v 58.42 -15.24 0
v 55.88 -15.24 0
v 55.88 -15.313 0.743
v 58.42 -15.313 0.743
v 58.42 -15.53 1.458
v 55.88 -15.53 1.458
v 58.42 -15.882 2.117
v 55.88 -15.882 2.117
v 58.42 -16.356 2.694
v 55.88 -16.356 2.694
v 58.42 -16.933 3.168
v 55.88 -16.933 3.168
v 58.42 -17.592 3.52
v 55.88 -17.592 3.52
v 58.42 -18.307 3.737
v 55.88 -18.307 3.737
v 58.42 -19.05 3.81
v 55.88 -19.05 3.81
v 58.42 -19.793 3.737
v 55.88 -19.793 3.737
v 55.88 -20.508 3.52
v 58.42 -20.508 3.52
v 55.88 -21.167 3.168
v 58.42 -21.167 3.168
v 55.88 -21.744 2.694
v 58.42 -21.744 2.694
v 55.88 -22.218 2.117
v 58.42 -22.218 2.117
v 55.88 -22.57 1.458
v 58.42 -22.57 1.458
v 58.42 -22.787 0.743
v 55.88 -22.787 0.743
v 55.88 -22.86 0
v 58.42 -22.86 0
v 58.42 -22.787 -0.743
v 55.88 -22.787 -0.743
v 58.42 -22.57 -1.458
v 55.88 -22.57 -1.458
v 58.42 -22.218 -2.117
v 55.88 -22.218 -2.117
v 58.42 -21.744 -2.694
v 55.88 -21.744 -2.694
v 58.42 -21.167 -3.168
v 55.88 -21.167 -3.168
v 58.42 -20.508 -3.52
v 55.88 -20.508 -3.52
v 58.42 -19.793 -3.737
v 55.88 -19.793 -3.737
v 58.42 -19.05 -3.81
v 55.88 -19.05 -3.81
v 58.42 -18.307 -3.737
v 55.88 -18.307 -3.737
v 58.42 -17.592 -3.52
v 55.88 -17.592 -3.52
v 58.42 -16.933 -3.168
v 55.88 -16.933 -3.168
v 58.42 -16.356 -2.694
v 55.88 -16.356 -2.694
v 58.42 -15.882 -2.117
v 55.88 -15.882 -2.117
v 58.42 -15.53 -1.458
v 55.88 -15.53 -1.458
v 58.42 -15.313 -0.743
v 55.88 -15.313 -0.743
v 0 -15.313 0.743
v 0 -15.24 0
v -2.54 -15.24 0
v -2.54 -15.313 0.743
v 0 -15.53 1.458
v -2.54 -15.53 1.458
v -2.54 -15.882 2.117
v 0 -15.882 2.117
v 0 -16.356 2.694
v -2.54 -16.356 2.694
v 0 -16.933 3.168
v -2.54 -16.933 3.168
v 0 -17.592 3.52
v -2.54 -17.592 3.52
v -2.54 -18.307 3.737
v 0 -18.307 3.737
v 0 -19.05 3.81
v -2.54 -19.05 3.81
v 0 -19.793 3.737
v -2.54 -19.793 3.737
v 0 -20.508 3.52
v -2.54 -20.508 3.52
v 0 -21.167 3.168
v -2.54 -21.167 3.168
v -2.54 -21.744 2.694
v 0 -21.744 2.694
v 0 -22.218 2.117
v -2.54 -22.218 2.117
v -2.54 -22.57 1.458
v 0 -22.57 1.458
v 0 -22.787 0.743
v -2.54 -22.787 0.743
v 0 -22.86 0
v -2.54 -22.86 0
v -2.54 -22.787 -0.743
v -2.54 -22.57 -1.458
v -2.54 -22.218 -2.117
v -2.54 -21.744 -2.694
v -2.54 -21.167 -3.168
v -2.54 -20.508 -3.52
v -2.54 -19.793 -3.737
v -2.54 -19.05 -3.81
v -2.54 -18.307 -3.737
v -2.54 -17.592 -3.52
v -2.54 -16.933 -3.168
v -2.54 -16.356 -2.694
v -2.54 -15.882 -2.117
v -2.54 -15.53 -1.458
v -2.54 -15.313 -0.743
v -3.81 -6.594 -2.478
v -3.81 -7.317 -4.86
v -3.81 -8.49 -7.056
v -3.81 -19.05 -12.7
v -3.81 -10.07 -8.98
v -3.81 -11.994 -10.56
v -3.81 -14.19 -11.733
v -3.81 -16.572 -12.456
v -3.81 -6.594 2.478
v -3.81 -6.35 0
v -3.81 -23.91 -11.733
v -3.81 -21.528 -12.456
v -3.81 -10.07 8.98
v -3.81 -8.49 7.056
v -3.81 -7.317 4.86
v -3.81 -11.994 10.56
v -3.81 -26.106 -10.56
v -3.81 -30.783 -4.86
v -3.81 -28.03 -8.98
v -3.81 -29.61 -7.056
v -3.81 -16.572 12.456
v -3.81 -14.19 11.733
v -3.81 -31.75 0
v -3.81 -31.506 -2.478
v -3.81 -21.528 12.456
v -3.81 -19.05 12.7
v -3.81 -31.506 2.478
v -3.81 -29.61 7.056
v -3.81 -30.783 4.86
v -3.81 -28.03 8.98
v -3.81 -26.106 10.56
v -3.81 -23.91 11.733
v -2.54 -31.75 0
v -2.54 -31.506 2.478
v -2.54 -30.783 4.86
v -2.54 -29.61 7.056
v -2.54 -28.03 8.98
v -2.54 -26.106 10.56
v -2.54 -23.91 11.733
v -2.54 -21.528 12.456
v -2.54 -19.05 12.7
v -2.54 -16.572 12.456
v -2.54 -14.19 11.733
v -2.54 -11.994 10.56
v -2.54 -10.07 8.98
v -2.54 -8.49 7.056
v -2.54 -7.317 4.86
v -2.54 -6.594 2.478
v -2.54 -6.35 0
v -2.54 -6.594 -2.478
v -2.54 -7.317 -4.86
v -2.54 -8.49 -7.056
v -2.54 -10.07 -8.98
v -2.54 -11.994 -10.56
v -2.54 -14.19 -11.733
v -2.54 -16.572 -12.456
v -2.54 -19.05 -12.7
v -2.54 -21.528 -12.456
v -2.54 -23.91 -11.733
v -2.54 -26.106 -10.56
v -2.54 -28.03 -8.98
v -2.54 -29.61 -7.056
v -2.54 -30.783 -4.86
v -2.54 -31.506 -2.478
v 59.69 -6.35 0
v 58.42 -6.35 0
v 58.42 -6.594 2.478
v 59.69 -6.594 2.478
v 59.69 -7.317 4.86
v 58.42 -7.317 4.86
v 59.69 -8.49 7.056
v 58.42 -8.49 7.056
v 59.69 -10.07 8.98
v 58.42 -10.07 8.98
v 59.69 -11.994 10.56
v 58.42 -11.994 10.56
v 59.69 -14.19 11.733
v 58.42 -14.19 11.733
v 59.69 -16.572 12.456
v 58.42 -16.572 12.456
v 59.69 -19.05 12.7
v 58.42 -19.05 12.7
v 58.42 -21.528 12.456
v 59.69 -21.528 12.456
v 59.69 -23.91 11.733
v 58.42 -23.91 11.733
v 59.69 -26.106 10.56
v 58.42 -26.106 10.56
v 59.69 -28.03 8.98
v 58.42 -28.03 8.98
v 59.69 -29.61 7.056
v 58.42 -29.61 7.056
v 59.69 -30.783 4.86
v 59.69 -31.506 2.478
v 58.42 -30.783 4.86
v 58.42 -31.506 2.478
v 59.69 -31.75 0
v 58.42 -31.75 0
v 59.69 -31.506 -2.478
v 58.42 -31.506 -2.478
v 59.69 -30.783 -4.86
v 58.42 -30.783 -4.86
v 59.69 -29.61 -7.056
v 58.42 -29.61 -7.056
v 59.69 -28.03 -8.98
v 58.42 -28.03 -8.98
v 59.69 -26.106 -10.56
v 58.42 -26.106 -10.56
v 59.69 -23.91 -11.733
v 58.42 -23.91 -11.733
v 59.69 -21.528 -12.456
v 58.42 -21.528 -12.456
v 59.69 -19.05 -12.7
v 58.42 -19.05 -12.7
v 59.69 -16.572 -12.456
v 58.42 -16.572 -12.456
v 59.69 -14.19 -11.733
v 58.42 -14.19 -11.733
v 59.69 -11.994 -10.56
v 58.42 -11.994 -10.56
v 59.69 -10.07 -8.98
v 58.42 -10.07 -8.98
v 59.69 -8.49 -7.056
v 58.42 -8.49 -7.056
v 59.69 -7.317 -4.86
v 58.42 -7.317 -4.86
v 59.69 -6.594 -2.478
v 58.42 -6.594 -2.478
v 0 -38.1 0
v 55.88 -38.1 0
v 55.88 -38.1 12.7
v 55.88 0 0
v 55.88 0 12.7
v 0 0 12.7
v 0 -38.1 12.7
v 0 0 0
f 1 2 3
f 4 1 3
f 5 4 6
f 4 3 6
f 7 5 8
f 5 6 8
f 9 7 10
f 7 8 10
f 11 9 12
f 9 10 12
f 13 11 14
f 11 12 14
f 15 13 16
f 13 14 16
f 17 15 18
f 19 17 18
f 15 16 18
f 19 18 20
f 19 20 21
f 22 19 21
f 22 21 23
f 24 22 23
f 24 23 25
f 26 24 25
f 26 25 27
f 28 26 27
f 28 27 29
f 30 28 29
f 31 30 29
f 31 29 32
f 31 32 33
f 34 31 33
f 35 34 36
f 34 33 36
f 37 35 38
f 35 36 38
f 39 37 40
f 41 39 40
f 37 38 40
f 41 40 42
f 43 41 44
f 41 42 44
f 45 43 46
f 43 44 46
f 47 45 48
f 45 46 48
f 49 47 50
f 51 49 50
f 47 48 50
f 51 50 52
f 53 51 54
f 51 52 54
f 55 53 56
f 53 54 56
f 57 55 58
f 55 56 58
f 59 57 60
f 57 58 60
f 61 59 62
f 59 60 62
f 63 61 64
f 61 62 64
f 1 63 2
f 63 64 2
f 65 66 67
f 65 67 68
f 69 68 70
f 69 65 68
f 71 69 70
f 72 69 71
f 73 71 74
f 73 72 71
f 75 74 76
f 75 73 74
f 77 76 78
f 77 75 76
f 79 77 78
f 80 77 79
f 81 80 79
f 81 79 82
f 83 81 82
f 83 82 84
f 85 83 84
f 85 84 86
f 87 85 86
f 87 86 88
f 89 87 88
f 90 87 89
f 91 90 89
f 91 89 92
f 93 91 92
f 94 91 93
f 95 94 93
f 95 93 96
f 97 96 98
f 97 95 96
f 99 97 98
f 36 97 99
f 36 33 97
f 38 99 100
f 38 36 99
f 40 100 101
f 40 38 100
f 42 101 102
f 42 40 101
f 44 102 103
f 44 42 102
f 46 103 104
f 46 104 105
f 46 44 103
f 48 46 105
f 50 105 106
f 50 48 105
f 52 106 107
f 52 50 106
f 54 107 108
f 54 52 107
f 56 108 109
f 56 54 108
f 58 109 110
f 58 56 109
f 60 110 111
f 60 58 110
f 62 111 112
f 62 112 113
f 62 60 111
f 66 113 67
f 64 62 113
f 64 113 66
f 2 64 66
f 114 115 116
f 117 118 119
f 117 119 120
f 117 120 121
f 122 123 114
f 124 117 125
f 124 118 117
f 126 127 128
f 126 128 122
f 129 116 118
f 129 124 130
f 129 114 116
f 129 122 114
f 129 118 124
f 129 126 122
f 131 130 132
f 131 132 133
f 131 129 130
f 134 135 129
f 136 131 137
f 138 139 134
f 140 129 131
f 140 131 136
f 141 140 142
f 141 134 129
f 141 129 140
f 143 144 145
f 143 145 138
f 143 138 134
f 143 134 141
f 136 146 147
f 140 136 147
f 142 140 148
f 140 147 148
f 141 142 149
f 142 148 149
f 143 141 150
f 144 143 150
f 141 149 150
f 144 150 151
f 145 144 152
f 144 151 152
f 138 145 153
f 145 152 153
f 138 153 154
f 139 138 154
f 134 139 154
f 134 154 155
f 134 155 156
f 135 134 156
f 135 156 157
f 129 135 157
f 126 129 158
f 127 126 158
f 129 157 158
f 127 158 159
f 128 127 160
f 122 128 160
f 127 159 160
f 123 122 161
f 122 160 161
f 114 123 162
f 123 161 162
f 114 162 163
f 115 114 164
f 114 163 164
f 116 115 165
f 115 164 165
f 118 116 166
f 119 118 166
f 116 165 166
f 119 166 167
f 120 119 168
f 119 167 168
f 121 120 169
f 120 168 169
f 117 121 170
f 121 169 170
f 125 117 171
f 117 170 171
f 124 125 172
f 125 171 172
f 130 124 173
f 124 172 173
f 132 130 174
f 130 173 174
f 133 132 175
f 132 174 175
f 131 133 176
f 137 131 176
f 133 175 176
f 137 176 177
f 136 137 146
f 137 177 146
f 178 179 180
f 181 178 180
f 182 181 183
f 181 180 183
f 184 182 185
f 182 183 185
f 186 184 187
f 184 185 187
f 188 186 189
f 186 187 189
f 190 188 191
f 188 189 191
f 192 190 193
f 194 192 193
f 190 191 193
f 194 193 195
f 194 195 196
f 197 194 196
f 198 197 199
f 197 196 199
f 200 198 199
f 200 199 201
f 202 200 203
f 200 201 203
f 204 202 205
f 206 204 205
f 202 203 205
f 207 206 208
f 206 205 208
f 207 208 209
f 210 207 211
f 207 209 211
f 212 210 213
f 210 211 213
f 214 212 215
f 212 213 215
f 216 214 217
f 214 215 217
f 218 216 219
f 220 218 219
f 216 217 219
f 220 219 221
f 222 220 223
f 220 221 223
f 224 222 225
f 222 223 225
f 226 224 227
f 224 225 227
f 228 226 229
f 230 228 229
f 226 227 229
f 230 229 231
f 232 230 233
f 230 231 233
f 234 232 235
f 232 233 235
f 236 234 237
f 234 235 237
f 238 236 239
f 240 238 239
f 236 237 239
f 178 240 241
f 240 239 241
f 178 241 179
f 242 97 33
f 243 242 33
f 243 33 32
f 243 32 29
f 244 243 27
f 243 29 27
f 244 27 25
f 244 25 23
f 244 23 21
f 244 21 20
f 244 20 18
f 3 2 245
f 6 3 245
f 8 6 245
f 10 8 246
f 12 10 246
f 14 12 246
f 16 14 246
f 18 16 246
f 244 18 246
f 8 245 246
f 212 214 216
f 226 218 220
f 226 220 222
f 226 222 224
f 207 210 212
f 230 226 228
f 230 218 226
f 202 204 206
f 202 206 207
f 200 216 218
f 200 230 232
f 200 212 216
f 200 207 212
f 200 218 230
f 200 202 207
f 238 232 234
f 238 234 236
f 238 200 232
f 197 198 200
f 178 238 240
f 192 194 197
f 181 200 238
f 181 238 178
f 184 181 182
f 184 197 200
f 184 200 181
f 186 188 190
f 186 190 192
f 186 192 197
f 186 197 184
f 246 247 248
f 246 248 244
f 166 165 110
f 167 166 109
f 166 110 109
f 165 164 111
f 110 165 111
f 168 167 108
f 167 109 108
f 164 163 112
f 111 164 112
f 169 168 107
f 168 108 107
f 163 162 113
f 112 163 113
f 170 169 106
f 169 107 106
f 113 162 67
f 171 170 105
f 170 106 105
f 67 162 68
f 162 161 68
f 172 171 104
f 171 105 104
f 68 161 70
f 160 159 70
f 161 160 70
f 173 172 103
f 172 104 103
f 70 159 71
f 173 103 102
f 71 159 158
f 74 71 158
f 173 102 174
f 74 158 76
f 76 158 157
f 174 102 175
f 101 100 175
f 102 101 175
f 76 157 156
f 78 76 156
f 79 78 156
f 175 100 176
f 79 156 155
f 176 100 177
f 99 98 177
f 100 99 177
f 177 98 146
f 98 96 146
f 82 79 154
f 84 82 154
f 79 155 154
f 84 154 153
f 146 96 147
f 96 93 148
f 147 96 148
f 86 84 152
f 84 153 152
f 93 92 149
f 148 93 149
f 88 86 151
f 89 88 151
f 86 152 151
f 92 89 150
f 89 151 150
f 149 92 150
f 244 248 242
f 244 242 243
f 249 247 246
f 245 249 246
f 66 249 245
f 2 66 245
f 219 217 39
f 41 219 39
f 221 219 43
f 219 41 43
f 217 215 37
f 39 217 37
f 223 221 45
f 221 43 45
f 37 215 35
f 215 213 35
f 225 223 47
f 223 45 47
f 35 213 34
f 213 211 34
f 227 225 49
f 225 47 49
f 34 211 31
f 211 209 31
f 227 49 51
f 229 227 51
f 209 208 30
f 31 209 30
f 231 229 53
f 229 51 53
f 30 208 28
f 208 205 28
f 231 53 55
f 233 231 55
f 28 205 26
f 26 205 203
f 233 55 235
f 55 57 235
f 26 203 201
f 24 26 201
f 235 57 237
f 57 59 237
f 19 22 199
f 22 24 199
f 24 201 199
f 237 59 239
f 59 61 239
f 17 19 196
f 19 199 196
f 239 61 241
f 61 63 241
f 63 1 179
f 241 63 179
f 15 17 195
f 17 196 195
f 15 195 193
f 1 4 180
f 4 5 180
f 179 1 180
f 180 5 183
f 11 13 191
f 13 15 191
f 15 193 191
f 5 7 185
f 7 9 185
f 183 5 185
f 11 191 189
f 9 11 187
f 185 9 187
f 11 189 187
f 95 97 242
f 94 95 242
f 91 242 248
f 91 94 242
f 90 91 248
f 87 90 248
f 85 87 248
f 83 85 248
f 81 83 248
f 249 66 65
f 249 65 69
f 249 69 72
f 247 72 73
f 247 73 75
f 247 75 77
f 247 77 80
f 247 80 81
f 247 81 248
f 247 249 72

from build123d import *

# Parameters (mm, degrees)
F0_W     = 55.88
F0_H     = 12.7
F1_DEPTH = 38.1
F3_DEPTH = 58.42
F2_R     = 3.81
F4_DEPTH = 2.54
F5_R     = 12.7
F6_DEPTH = 1.27
F7_R     = 12.7
F8_DEPTH = 1.27


with BuildPart() as f1:
    # F0 (on Front) → F1 (new body)
    with BuildSketch(Plane.XZ):
        with Locations((27.94, 6.35)):
            Rectangle(F0_W, F0_H)
    extrude(amount=F1_DEPTH)

    # F2 (on face) → F3 (join)
    with BuildSketch(Plane.YZ.offset(55.88)):
        with BuildLine():
            ThreePointArc((-22.86, 0), (-19.05, -3.81), (-15.24, 0))
            Line((-15.24, 0), (-22.86, 0))
        make_face()
        with BuildLine():
            Line((-22.86, 0), (-15.24, 0))
            ThreePointArc((-15.24, 0), (-19.05, 3.81), (-22.86, 0))
        make_face()
    extrude(amount=-F3_DEPTH)

    # F2 (on face) → F4 (join)
    with BuildSketch(Plane.YZ.offset(55.88)):
        with Locations((-19.05, 0)):
            Circle(F2_R)
    extrude(amount=F4_DEPTH)

    # F5 (on face) → F6 (join)
    with BuildSketch(Plane(origin=(-2.54, 0, 0), x_dir=(0, -1, 0), z_dir=(-1, 0, 0))):
        with Locations((19.05, 0)):
            Circle(F5_R)
    extrude(amount=F6_DEPTH)

    # F7 (on face) → F8 (join)
    with BuildSketch(Plane.YZ.offset(58.42)):
        with Locations((-19.05, 0)):
            Circle(F7_R)
    extrude(amount=F8_DEPTH)


solid = f1.part
